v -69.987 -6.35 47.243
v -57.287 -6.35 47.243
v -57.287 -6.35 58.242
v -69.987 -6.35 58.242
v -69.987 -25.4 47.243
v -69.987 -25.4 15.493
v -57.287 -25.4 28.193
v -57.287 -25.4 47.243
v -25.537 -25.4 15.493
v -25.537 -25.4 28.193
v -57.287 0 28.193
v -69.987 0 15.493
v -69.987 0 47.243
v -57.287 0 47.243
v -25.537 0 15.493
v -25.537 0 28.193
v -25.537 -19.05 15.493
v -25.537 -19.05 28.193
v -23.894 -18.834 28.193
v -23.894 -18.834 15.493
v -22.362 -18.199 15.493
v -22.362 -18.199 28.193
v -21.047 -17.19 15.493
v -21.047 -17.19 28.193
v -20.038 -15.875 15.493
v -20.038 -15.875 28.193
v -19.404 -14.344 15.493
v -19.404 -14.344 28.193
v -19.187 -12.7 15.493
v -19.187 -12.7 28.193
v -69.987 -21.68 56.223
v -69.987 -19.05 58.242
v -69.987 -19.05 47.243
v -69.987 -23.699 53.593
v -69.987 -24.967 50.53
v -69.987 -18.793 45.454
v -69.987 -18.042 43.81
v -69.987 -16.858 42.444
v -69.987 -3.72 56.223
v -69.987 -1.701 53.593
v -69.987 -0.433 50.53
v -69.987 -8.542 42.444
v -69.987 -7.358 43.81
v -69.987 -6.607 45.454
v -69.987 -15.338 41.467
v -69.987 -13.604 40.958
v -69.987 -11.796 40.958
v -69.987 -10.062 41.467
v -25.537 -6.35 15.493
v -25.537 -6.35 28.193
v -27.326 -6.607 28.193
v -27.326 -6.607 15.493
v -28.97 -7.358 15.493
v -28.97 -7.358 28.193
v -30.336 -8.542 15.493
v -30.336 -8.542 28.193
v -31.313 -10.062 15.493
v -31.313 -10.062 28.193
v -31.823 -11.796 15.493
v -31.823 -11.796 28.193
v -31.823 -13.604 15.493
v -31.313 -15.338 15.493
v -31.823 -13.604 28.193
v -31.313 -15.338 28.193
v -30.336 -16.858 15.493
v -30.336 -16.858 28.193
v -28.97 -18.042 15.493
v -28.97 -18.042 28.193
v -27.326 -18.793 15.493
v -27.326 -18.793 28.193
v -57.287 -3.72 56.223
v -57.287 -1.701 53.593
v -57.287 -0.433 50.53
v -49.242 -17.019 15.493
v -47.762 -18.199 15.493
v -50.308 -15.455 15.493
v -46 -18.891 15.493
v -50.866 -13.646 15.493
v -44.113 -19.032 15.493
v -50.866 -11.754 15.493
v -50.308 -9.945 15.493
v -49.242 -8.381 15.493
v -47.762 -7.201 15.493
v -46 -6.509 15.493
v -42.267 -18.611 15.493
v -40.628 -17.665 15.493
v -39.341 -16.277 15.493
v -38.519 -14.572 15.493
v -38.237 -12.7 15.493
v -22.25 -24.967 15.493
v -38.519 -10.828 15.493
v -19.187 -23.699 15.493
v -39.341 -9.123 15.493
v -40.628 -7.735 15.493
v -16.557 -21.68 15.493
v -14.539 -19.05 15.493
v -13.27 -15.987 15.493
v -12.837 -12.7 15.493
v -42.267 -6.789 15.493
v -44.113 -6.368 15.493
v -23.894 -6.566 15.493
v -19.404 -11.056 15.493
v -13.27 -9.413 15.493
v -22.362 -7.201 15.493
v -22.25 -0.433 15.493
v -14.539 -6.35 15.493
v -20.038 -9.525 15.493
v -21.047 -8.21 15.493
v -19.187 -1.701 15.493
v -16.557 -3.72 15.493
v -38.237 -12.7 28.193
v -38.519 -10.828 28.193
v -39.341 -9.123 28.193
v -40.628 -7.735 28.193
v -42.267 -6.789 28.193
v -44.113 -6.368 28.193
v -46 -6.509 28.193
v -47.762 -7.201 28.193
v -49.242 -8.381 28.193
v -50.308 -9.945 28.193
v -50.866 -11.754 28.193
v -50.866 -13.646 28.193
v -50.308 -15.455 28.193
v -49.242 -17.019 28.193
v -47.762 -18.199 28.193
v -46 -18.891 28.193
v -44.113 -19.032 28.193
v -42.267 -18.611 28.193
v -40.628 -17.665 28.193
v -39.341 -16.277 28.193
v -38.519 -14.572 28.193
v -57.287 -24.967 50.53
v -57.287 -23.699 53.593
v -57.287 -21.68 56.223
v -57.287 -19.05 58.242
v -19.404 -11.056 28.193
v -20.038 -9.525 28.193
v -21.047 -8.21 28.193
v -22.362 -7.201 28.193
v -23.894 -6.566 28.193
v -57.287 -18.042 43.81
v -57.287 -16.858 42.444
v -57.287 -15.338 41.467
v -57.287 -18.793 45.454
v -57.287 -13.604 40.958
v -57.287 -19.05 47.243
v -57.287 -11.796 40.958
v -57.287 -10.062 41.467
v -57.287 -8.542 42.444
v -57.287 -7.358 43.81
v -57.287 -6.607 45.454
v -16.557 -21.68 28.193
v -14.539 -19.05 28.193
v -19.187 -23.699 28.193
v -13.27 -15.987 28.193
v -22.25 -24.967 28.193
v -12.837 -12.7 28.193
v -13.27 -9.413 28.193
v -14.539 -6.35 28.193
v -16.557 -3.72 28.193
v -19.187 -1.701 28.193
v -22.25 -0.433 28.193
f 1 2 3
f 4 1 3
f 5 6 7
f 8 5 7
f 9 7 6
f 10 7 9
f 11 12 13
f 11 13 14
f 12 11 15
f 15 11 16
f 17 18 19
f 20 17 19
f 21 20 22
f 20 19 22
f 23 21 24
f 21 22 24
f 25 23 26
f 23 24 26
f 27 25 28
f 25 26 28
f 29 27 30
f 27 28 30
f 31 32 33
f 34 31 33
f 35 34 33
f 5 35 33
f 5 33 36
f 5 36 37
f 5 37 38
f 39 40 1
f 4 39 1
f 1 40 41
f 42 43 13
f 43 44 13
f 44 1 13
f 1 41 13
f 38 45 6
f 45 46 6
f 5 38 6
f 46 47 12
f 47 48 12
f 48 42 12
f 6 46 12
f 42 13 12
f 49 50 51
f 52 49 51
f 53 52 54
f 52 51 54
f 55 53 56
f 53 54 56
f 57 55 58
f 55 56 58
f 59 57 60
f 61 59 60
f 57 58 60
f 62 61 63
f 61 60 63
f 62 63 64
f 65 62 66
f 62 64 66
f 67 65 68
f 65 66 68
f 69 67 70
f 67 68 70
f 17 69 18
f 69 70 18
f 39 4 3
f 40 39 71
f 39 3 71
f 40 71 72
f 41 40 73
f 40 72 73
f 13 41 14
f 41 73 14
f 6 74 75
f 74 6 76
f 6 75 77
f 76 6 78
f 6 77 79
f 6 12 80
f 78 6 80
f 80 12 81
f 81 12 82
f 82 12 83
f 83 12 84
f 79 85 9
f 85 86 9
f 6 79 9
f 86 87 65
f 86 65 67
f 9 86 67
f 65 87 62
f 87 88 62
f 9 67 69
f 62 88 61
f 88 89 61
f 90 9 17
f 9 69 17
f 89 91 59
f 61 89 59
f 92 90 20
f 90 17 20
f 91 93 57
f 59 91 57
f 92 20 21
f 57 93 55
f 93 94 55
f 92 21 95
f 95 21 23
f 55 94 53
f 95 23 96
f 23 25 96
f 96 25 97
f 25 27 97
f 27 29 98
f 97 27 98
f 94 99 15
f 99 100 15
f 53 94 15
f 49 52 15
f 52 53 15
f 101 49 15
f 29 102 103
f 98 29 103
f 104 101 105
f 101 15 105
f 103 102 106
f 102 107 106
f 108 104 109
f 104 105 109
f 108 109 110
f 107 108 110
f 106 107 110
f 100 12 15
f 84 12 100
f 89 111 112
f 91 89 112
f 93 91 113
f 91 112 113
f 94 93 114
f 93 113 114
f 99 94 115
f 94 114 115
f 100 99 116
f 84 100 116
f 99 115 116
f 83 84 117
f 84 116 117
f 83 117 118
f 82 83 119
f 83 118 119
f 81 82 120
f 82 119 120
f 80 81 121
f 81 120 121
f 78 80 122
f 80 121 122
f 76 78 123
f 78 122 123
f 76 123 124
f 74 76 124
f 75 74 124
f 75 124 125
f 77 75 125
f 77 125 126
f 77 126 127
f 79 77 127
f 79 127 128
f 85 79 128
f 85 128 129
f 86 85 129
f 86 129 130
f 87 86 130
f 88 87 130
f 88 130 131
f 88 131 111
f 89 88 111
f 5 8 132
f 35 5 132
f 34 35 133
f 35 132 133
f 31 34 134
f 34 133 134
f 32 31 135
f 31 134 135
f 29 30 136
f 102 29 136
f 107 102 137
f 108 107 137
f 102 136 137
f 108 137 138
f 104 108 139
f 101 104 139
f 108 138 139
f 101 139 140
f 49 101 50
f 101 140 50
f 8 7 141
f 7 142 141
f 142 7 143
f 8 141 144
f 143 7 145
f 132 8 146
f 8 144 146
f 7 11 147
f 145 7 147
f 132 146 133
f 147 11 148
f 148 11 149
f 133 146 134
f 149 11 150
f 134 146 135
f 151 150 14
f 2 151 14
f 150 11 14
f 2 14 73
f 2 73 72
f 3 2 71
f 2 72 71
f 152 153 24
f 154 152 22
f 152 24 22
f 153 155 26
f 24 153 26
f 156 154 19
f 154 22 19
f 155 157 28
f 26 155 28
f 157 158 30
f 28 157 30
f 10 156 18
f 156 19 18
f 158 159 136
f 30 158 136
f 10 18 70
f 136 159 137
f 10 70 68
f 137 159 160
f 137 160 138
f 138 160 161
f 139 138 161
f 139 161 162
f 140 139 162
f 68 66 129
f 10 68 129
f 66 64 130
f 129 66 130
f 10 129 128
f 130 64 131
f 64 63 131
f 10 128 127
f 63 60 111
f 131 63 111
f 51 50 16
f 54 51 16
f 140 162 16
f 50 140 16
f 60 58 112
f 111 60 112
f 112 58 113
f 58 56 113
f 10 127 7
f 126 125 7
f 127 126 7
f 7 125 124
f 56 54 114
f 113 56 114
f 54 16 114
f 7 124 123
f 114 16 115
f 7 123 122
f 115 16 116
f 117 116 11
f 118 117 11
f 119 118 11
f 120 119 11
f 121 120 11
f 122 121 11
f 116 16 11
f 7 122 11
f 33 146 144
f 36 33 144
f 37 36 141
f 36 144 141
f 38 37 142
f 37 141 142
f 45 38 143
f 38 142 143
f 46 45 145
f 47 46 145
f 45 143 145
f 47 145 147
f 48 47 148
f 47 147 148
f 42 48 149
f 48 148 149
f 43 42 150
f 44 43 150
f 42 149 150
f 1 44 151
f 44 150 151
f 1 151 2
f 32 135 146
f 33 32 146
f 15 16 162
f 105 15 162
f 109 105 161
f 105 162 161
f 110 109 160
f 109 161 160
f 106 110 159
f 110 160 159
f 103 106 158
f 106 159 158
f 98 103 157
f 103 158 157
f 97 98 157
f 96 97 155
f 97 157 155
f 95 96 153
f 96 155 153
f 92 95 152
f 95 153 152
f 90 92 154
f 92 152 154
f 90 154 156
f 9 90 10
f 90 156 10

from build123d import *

# Parameters (mm, degrees)
F1_DEPTH = 25.4
F2_R     = 6.35
F3_DEPTH = 12.701
F5_DEPTH = 12.701


with BuildPart() as f1:
    # F0 (on Front) → F1 (new body)
    with BuildSketch(Plane.XZ):
        Polygon((-57.2872110233, 59.9430727009), (-69.9872110233, 59.9430727009), (-69.9872110233, 15.4930727009), (-12.8372110233, 15.4930727009), (-12.8372110233, 28.1930727009), (-57.2872110233, 28.1930727009), align=None)
    extrude(amount=F1_DEPTH)

    # F2 (on face) → F3 (cut, through all)
    with BuildSketch(Plane.XY.offset(28.1930727009)):
        with BuildLine():
            ThreePointArc((-12.8372110233, -12.7000000115), (-16.5569549063, -21.6802561251), (-25.5372110233, -25.4))
            Line((-25.5372110233, -25.4), (-12.8372110233, -25.4))
            Line((-12.8372110233, -25.4), (-12.8372110233, -12.7000000115))
        make_face()
        with BuildLine():
            Line((-12.8372110233, 0), (-25.5372110233, 0))
            ThreePointArc((-25.5372110233, 0), (-16.5569548981, -3.719743883), (-12.8372110233, -12.7000000115))
            Line((-12.8372110233, -12.7000000115), (-12.8372110233, 0))
        make_face()
        with BuildLine():
            ThreePointArc((-25.5372110233, -19.05), (-21.0470829627, -17.1901280605), (-19.1872110233, -12.7))
            ThreePointArc((-19.1872110233, -12.7), (-21.0470829627, -8.2098719395), (-25.5372110233, -6.35))
            ThreePointArc((-25.5372110233, -6.35), (-31.8872110233, -12.7), (-25.5372110233, -19.05))
        make_face()
        with Locations((-44.5872110233, -12.7)):
            Circle(F2_R)
    extrude(amount=-F3_DEPTH, mode=Mode.SUBTRACT)

    # F4 (on face) → F5 (cut, through all)
    with BuildSketch(Plane.YZ.offset(-57.2872110233)):
        with BuildLine():
            Line((-25.4, 59.9430727009), (-25.4, 47.2430727009))
            ThreePointArc((-25.4, 47.2430727009), (-23.6985226281, 53.5930727009), (-19.05, 58.2415953289))
            Line((-19.05, 58.2415953289), (-19.05, 59.9430727009))
            Line((-19.05, 59.9430727009), (-25.4, 59.9430727009))
        make_face()
        with BuildLine():
            ThreePointArc((-6.35, 58.2415953289), (-1.7014773719, 53.5930727009), (0, 47.2430727009))
            Line((0, 47.2430727009), (0, 59.9430727009))
            Line((0, 59.9430727009), (-6.35, 59.9430727009))
            Line((-6.35, 59.9430727009), (-6.35, 58.2415953289))
        make_face()
        with BuildLine():
            ThreePointArc((-12.7, 59.9430727009), (-9.4129981272, 59.5103306947), (-6.35, 58.2415953289))
            Line((-6.35, 58.2415953289), (-6.35, 59.9430727009))
            Line((-6.35, 59.9430727009), (-12.7, 59.9430727009))
        make_face()
        with BuildLine():
            Line((-19.05, 59.9430727009), (-19.05, 58.2415953289))
            ThreePointArc((-19.05, 58.2415953289), (-15.9870018728, 59.5103306947), (-12.7, 59.9430727009))
            Line((-12.7, 59.9430727009), (-19.05, 59.9430727009))
        make_face()
        with BuildLine():
            Line((-12.7, 47.2430727009), (-6.35, 47.2430727009))
            ThreePointArc((-6.35, 47.2430727009), (-12.7, 53.5930727009), (-19.05, 47.2430727009))
            Line((-19.05, 47.2430727009), (-12.7, 47.2430727009))
        make_face()
        with BuildLine():
            ThreePointArc((-19.05, 47.2430727009), (-12.7, 40.8930727009), (-6.35, 47.2430727009))
            Line((-6.35, 47.2430727009), (-12.7, 47.2430727009))
            Line((-12.7, 47.2430727009), (-19.05, 47.2430727009))
        make_face()
        with BuildLine():
            ThreePointArc((-19.05, 47.2430727009), (-12.7, 53.5930727009), (-6.35, 47.2430727009))
            Line((-6.35, 47.2430727009), (-6.35, 58.2415953289))
            ThreePointArc((-6.35, 58.2415953289), (-9.4129981272, 59.5103306947), (-12.7, 59.9430727009))
            ThreePointArc((-12.7, 59.9430727009), (-15.9870018728, 59.5103306947), (-19.05, 58.2415953289))
            Line((-19.05, 58.2415953289), (-19.05, 47.2430727009))
        make_face()
    extrude(amount=-F5_DEPTH, mode=Mode.SUBTRACT)


solid = f1.part
